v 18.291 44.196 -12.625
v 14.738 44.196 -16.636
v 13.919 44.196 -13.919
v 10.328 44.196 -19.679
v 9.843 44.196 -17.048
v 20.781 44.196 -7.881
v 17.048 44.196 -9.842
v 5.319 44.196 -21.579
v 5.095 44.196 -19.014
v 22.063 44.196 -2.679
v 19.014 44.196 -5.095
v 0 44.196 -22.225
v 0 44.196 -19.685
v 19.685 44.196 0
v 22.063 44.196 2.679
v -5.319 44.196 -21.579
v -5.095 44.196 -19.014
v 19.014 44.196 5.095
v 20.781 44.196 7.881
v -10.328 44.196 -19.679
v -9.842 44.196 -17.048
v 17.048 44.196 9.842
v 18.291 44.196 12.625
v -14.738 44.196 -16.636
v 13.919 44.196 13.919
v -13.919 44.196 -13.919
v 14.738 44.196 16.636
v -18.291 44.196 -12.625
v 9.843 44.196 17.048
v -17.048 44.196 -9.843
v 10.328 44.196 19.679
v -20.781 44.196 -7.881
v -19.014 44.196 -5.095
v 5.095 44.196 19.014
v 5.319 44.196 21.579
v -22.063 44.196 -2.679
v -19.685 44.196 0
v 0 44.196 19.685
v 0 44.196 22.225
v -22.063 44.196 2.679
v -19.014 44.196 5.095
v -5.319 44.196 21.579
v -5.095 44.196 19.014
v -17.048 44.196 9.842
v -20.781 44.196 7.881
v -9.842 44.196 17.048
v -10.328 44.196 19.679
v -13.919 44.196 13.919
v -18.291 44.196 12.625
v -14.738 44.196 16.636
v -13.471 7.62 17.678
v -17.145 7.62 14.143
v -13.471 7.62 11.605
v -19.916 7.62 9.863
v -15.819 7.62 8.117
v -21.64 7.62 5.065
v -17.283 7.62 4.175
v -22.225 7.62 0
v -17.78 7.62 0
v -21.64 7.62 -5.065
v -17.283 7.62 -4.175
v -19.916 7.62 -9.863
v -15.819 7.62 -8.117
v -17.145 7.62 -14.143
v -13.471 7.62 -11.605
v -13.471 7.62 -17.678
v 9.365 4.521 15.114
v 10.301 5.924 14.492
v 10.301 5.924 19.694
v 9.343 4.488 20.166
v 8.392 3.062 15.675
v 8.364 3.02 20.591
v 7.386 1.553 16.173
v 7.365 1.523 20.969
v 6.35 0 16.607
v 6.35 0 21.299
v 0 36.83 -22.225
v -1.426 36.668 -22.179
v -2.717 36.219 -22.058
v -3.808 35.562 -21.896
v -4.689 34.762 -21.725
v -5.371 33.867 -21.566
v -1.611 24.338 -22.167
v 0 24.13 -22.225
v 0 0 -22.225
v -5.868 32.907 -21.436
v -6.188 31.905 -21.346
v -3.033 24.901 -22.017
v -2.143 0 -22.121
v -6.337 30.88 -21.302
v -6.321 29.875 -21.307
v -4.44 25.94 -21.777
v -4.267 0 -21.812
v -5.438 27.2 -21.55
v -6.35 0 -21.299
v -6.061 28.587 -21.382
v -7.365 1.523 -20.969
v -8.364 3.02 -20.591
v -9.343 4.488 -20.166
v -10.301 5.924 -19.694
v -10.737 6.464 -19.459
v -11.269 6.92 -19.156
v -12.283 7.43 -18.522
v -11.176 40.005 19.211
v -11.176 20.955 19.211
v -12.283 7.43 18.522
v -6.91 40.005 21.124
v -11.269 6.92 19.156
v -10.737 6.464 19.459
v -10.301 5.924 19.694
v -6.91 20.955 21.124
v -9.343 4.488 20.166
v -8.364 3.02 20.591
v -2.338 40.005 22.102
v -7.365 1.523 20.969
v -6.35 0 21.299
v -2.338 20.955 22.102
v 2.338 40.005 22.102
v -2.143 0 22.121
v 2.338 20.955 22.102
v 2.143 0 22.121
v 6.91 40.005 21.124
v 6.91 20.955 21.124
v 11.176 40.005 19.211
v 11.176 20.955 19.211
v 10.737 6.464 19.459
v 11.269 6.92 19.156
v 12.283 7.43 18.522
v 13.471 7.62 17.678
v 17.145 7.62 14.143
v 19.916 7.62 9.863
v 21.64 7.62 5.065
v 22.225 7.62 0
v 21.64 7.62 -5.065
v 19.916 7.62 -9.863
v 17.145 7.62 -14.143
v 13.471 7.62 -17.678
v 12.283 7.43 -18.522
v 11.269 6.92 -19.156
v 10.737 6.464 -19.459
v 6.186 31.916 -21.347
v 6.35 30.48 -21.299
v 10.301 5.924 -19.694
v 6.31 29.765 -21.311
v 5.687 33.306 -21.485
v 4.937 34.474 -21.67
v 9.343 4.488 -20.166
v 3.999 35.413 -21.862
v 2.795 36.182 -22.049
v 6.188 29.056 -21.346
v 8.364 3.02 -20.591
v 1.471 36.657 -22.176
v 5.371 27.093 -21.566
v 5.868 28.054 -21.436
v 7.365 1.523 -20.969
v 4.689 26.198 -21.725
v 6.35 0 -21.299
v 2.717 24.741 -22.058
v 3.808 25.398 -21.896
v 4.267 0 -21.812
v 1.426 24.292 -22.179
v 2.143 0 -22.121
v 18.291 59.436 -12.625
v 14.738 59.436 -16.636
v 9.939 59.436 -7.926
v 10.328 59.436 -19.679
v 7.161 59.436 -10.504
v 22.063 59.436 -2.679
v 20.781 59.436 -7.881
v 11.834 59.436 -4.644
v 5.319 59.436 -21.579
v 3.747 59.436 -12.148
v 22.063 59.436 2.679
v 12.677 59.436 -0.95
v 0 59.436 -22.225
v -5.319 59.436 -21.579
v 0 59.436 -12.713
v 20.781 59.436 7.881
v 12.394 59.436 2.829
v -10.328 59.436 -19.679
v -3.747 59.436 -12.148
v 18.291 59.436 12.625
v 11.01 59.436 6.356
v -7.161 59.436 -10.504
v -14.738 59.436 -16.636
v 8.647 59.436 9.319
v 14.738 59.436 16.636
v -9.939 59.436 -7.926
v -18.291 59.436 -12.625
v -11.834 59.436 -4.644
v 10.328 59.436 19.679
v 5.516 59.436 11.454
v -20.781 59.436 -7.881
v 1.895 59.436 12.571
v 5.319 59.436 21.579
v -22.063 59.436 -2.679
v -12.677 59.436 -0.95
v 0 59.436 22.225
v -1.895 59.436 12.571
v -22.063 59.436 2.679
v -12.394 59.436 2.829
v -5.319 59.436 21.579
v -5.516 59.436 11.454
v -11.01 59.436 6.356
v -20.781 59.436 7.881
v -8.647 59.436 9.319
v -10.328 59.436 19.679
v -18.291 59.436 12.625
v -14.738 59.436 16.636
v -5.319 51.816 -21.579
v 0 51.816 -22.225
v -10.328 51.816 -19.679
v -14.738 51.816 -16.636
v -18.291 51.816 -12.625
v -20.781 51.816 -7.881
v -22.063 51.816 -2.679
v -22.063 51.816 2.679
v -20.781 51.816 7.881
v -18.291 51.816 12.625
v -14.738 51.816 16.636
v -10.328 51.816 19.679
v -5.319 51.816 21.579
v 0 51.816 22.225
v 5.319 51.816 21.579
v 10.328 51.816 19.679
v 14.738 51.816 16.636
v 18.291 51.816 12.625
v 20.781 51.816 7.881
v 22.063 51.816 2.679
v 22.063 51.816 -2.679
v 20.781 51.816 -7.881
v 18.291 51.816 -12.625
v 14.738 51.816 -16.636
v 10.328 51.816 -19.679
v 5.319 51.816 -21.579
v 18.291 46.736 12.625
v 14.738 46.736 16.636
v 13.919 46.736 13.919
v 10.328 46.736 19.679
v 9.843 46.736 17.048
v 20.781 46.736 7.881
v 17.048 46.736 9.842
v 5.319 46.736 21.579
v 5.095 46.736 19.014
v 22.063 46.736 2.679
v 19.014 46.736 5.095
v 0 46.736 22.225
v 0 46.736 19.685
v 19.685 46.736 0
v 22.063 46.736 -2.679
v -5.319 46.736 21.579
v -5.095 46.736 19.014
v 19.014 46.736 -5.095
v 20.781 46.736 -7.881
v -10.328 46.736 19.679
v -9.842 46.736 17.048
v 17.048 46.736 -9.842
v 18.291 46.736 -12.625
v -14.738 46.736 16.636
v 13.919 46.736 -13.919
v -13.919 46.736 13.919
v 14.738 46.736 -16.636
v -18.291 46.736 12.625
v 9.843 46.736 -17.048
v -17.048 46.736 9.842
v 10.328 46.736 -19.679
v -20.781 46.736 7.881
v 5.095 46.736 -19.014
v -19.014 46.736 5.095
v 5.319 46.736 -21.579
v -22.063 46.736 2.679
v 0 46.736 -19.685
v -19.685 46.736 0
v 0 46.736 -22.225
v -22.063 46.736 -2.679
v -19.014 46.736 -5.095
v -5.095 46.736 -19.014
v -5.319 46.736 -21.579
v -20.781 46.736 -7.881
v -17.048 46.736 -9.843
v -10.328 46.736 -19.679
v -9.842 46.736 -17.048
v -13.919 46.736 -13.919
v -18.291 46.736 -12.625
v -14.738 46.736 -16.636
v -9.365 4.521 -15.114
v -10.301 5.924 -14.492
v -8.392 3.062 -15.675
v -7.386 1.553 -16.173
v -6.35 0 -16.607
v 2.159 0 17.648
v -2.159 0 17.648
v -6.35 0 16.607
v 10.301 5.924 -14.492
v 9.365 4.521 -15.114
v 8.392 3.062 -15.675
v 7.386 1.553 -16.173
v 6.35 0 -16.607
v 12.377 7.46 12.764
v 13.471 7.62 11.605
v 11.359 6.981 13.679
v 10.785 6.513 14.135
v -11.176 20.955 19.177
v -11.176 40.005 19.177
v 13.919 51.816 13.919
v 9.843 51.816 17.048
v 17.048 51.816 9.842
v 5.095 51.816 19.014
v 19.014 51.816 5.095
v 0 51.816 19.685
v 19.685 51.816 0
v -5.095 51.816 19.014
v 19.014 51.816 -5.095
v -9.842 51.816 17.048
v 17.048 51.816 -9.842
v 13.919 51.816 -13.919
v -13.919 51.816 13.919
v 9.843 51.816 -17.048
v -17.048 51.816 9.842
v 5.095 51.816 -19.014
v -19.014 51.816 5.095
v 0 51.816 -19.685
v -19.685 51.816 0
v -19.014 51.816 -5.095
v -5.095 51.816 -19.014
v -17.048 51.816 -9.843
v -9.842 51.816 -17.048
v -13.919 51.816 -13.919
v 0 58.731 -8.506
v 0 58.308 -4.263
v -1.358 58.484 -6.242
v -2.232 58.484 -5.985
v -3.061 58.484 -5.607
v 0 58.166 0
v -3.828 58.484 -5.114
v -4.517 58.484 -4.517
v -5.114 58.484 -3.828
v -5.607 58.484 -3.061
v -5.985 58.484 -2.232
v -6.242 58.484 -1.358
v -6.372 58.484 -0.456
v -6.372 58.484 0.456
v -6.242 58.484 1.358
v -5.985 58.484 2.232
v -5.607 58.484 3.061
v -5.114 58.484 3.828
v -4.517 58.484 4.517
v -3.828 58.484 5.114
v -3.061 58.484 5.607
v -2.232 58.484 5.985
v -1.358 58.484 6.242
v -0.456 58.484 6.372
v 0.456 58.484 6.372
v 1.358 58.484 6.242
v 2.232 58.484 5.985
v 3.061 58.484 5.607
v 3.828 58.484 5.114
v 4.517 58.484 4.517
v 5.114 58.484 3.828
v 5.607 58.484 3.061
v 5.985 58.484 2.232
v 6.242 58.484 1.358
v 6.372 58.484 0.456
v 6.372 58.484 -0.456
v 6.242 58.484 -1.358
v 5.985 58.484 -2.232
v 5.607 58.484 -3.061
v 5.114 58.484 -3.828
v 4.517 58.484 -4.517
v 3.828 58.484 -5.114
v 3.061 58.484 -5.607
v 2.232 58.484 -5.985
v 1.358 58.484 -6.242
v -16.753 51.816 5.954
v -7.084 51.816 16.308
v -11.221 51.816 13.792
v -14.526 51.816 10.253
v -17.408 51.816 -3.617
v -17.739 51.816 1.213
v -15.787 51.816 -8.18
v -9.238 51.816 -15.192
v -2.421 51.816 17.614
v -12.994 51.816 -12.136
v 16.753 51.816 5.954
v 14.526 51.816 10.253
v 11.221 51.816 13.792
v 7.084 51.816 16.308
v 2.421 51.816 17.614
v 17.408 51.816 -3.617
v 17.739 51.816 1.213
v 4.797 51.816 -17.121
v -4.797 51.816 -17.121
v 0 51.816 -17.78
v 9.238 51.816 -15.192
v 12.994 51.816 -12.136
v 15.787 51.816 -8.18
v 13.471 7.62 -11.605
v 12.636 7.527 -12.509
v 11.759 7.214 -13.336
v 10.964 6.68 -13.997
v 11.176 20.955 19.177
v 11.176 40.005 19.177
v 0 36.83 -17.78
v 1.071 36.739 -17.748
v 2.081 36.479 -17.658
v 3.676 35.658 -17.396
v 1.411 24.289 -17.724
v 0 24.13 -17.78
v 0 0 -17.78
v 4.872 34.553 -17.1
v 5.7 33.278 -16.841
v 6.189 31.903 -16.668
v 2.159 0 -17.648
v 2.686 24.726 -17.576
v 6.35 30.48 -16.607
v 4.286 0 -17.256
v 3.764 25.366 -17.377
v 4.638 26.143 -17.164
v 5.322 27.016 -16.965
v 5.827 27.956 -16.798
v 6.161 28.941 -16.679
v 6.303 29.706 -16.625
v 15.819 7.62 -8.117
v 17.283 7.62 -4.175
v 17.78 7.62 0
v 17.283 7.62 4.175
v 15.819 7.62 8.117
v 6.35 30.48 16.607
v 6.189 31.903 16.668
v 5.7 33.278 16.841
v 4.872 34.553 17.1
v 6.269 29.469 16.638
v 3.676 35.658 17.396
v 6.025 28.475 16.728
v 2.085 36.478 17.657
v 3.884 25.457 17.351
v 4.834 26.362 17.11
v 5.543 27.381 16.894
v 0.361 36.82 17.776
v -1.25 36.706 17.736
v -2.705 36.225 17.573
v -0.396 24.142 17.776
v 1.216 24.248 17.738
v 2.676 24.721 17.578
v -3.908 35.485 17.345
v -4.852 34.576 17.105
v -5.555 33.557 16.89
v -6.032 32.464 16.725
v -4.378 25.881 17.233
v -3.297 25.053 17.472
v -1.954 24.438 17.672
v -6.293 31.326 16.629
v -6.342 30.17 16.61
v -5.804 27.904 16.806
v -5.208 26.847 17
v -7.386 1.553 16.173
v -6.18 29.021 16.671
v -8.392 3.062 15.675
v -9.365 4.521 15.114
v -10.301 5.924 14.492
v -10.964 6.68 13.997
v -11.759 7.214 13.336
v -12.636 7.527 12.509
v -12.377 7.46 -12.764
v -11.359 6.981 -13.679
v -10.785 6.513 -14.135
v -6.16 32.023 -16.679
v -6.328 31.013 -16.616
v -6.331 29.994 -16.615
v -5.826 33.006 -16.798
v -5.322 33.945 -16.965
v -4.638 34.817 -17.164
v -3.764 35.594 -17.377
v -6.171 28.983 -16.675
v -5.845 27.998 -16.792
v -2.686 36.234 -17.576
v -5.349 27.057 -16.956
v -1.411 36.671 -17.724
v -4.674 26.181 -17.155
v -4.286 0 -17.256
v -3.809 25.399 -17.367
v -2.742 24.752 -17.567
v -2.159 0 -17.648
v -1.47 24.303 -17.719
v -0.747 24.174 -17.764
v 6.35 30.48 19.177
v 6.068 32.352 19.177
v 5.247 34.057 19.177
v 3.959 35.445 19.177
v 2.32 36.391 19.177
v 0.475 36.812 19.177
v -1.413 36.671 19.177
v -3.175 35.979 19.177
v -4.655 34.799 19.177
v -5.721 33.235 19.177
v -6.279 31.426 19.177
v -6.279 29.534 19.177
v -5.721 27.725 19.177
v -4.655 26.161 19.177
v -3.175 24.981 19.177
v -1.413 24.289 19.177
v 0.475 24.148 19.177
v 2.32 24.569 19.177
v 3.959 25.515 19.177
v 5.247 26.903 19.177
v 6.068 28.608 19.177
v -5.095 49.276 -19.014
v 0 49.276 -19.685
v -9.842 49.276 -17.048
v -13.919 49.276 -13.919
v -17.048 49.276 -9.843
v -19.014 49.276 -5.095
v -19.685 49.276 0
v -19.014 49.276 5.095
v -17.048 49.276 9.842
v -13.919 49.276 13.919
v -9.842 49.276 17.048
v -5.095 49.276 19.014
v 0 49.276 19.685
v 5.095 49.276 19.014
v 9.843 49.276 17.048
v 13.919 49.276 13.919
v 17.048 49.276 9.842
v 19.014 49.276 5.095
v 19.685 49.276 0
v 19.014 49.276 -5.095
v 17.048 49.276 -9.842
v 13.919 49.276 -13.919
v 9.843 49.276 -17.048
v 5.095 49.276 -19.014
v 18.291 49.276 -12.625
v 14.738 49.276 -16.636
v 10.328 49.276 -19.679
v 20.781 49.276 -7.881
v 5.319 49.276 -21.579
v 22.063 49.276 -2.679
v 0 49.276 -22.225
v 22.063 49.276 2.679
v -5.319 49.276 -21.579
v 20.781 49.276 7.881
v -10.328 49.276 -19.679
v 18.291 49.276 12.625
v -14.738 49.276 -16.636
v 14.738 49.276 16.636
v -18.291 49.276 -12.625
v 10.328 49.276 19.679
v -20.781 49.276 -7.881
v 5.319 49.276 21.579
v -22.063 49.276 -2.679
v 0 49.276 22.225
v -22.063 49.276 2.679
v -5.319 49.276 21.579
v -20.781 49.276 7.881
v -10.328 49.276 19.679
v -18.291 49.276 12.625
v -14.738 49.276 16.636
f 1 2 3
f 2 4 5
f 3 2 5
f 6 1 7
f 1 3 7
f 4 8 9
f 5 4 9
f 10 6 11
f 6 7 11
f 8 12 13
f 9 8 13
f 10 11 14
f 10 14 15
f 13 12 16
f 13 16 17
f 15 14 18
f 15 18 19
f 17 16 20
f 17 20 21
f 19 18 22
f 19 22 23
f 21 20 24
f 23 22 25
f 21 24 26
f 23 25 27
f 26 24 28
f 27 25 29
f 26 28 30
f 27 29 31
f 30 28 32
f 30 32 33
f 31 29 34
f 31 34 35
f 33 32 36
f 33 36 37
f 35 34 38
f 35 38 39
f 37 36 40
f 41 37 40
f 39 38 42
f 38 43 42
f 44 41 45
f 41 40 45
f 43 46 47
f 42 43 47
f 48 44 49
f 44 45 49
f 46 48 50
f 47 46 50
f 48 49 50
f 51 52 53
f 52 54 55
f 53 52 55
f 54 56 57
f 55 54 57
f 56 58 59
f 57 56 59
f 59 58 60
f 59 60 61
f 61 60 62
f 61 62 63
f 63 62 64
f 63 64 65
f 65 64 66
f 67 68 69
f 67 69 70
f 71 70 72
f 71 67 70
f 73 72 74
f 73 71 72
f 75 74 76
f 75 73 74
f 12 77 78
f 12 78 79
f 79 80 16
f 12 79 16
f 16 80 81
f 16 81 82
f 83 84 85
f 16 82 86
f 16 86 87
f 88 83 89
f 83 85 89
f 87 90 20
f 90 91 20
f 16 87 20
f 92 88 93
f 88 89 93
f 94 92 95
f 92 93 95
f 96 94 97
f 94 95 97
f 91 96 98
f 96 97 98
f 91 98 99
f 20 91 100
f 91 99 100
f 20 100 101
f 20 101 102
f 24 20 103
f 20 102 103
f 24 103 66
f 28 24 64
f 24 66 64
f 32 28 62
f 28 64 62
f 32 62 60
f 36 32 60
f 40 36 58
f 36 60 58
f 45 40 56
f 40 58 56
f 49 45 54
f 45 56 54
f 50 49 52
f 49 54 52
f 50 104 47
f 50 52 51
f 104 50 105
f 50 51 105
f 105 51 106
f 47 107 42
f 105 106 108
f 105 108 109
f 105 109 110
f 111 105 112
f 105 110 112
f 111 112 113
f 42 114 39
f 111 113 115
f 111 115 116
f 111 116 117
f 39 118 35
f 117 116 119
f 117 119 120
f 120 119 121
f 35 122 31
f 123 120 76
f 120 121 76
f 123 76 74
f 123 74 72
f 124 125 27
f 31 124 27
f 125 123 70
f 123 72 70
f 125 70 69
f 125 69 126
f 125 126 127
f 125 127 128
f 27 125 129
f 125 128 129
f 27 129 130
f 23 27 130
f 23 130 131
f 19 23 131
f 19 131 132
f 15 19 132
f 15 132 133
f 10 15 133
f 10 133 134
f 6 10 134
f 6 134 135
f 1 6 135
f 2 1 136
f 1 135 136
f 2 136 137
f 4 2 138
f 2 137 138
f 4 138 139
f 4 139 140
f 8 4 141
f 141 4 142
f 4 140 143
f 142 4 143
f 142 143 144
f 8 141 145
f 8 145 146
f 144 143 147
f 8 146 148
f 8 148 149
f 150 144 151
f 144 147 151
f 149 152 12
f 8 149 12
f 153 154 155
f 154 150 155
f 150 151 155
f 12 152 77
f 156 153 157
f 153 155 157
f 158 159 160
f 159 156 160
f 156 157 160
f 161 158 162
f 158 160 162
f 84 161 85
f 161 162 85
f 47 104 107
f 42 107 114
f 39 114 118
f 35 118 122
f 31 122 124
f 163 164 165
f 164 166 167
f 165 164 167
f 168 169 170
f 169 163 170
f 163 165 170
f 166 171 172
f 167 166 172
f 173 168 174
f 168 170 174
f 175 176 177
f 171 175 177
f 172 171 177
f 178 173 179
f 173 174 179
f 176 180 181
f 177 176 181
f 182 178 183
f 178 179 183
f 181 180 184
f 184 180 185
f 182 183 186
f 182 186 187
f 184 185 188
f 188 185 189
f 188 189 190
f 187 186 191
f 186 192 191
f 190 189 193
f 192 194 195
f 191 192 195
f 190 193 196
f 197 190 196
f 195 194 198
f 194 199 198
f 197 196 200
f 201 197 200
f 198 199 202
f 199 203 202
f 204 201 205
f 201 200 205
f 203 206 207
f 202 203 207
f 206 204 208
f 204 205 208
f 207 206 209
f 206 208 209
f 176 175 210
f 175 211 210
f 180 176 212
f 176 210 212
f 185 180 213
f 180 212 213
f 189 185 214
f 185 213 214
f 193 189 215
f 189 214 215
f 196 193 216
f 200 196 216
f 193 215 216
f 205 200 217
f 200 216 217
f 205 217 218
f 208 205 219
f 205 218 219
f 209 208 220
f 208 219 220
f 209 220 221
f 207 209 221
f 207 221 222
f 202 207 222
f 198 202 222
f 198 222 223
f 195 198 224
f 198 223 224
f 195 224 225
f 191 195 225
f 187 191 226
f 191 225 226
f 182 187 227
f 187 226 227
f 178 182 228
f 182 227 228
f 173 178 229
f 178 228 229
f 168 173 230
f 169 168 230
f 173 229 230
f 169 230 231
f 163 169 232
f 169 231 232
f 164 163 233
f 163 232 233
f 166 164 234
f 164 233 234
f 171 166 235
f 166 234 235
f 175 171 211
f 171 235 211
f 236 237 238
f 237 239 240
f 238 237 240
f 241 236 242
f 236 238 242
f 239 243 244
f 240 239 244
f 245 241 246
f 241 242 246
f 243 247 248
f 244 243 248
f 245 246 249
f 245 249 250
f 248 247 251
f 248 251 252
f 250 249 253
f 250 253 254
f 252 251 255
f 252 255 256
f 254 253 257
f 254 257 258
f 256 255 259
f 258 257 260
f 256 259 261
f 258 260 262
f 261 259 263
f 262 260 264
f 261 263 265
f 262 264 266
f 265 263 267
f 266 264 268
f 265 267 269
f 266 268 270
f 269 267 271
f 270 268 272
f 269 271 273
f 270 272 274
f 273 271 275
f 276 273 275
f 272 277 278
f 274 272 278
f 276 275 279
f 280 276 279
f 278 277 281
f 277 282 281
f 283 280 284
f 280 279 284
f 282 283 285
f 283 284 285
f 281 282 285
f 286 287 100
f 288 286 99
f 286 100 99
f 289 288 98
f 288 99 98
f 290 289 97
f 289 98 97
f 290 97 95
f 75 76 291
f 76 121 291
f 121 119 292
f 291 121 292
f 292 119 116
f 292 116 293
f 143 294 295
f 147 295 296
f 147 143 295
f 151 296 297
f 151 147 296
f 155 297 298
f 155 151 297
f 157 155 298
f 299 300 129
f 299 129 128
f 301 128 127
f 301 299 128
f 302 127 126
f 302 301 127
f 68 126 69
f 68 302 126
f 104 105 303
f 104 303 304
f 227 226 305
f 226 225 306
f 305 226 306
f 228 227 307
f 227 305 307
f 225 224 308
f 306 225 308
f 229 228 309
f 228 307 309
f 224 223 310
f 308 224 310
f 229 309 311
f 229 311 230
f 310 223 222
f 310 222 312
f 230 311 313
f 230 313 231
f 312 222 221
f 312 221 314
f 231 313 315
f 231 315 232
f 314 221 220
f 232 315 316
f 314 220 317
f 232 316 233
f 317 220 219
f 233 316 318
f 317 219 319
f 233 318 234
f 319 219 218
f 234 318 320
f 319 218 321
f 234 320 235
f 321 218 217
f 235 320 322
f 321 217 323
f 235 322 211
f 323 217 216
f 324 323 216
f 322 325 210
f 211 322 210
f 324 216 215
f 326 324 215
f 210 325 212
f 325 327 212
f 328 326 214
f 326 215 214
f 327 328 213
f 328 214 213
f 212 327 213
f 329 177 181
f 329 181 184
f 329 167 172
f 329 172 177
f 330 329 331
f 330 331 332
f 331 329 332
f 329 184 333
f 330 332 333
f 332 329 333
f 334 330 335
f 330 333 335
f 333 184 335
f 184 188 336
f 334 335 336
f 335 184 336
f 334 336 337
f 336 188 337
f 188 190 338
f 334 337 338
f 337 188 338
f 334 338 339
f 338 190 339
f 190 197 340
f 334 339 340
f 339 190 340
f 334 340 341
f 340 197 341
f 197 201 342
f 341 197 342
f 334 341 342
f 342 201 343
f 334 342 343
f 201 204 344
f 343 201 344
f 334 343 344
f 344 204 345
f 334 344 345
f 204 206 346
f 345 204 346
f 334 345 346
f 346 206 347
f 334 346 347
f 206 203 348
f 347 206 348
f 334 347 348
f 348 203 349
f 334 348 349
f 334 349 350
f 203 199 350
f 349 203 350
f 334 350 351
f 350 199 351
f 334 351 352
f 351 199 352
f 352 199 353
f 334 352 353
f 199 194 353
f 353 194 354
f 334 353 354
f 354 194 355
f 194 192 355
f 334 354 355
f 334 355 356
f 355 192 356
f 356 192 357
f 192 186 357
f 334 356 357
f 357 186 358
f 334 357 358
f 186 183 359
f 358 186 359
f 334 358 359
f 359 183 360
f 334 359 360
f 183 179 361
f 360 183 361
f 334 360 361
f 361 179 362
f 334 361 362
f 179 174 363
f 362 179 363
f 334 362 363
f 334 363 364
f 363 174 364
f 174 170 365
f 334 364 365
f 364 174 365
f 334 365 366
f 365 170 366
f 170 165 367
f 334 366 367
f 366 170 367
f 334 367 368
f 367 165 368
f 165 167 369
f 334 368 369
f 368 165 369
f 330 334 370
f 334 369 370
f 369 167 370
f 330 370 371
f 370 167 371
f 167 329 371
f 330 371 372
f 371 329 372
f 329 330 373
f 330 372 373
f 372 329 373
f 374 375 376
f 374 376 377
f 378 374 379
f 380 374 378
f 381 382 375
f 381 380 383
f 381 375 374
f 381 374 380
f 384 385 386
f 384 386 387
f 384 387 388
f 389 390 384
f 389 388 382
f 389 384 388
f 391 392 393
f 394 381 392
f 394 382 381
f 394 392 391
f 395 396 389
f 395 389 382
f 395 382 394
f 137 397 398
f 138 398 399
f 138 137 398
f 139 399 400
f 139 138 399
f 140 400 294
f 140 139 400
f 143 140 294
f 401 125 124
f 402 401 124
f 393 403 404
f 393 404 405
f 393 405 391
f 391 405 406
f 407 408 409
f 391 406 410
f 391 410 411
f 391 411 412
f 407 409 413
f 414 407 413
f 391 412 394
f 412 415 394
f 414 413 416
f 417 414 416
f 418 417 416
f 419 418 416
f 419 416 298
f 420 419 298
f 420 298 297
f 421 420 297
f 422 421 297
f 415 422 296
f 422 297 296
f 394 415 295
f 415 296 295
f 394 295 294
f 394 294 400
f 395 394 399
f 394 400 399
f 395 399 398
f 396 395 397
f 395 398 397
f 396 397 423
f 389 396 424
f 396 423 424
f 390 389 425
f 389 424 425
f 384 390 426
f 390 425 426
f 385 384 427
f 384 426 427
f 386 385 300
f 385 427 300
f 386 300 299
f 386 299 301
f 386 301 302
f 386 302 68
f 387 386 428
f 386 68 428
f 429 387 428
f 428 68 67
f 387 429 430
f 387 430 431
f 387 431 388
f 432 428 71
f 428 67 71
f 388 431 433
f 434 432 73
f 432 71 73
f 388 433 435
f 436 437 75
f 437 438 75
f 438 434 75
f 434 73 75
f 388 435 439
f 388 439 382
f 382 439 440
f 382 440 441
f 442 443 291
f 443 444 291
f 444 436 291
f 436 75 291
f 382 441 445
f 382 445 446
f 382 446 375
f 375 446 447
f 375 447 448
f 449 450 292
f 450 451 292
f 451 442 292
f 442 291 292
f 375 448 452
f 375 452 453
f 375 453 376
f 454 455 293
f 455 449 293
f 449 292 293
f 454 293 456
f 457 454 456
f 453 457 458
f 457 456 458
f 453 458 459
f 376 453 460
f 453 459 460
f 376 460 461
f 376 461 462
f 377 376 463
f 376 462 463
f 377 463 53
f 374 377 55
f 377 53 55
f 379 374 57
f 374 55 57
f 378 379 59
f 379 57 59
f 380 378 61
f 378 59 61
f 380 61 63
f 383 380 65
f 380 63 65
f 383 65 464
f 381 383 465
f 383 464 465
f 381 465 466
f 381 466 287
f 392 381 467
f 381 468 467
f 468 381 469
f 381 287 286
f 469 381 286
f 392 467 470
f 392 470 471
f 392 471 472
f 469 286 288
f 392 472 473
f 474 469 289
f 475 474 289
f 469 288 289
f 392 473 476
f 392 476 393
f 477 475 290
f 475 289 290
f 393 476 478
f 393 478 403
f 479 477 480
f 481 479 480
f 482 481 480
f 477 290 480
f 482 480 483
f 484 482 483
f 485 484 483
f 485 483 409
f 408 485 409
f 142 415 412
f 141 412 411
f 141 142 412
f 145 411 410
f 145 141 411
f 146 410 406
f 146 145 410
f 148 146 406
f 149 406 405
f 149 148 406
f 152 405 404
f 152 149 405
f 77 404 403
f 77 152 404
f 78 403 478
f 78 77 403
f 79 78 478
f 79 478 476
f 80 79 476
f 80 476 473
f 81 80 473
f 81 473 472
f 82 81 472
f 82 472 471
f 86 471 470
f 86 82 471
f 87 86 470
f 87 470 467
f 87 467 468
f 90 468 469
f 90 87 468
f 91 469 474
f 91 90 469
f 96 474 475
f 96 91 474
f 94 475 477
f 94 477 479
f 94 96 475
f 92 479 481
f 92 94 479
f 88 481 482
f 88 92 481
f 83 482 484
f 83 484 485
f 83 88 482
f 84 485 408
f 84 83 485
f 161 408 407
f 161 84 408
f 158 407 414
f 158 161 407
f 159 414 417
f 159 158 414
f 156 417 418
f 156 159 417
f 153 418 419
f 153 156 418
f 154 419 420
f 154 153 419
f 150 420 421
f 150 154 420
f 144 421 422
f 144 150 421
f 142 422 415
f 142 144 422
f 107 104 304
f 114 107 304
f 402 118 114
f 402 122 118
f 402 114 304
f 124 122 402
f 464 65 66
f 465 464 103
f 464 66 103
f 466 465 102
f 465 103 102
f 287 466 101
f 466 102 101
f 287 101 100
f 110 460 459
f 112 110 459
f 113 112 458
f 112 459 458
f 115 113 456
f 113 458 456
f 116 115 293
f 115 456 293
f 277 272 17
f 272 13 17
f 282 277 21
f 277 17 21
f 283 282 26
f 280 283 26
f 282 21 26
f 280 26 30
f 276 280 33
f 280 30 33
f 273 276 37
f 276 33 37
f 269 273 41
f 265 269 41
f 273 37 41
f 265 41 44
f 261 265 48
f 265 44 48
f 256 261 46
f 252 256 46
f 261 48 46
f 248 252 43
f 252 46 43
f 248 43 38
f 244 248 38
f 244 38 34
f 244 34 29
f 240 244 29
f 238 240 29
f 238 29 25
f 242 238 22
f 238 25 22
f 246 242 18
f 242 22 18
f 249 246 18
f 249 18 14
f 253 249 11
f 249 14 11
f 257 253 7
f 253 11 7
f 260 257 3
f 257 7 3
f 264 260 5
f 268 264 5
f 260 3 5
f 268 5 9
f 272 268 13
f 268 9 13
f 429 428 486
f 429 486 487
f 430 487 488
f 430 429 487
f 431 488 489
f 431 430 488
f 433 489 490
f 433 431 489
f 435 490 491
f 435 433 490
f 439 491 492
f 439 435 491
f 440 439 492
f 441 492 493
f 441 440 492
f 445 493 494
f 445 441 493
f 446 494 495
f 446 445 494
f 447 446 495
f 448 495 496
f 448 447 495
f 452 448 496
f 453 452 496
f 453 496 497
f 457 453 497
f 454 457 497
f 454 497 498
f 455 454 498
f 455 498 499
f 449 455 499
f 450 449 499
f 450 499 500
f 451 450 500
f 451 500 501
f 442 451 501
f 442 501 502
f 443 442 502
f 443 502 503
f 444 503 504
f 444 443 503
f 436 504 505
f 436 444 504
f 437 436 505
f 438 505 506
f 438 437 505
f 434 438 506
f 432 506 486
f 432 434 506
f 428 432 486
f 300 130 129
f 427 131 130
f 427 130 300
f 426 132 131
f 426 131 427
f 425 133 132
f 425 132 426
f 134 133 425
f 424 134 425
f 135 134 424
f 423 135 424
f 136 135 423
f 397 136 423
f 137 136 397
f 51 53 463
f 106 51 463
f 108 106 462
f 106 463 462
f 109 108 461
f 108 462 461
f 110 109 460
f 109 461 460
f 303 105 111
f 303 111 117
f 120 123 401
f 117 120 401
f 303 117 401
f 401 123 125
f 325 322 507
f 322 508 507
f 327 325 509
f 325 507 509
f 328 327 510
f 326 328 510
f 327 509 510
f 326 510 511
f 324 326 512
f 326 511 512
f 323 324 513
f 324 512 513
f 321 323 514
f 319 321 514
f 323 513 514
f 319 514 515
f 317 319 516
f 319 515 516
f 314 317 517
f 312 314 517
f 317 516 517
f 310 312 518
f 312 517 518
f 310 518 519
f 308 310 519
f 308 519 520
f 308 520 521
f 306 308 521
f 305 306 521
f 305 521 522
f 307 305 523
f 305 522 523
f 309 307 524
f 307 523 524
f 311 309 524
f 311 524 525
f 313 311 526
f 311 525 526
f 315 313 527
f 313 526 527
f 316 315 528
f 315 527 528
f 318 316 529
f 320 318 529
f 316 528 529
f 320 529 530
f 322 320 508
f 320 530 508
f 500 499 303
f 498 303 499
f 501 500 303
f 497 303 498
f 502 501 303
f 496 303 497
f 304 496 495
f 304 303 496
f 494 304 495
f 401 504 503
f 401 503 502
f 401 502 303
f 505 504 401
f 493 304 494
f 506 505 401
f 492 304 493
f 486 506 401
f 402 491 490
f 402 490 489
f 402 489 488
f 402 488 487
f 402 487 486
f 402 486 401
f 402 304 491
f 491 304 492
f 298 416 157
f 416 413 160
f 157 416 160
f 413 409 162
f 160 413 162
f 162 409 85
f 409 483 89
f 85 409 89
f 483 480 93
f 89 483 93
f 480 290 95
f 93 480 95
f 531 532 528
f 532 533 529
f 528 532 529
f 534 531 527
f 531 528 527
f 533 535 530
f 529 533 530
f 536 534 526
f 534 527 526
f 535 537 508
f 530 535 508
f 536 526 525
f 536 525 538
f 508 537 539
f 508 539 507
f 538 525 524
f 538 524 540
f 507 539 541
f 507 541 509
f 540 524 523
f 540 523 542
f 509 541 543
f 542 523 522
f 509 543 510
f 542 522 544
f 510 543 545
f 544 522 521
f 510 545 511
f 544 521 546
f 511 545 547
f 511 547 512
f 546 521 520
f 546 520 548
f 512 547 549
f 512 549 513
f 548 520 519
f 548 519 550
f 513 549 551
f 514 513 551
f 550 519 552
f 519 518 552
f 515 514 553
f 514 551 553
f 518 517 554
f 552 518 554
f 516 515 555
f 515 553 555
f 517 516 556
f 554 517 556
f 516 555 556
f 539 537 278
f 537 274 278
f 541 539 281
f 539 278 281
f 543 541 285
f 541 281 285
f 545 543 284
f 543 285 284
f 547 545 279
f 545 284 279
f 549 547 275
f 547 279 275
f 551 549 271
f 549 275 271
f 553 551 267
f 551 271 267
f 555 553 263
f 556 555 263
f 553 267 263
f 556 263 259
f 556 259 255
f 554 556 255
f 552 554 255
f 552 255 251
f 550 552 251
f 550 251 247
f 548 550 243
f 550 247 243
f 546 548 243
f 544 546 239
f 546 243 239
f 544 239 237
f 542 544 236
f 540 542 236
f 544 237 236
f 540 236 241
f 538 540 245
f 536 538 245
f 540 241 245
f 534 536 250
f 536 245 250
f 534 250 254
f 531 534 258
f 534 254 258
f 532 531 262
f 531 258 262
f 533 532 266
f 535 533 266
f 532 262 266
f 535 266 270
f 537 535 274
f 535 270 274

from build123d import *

# Parameters (mm, degrees)
CUT_EXTRUDE1_DEPTH      = 68.23495628
CUT_EXTRUDE1_DEPTH_BACK = 68.23495628
SKETCH3_R               = 17.78
CUT_EXTRUDE2_DEPTH      = 51.816
CUT_EXTRUDE3_DEPTH      = 68.234956346
CUT_EXTRUDE3_DEPTH_BACK = 68.234956346
SKETCH4_R               = 6.35
CUT_EXTRUDE4_START      = 22.225
SKETCH5_W               = 22.352
SKETCH5_H               = 19.05
CUT_EXTRUDE4_DEPTH      = 3.048


with BuildPart() as part:
    # Sketch1 → Revolve1 (revolve)
    with BuildSketch(Plane.XY, mode=Mode.PRIVATE) as revolve1_sk:
        with BuildLine():
            Line((0, 0), (0, 58.166))
            ThreePointArc((0, 58.166), (6.387986381, 58.484288237), (12.712693656, 59.436))
            Line((12.712693656, 59.436), (22.225, 59.436))
            Line((22.225, 59.436), (22.225, 51.816))
            Line((22.225, 51.816), (19.685, 51.816))
            Line((19.685, 51.816), (19.685, 49.276))
            Line((19.685, 49.276), (22.225, 49.276))
            Line((22.225, 49.276), (22.225, 46.736))
            Line((22.225, 46.736), (19.685, 46.736))
            Line((19.685, 46.736), (19.685, 44.196))
            Line((19.685, 44.196), (22.225, 44.196))
            Line((22.225, 44.196), (22.225, 0))
            Line((22.225, 0), (0, 0))
        make_face()
    revolve(revolve1_sk.sketch.rotate(Axis((0, 59.436, 0), (0, 1, 0)), 90), axis=Axis((0, 59.436, 0), (0, 1, 0)))

    # Sketch2 → Cut-Extrude1 (cut, two sides: drawn at the far end of the back side and taken through both)
    with BuildSketch(Plane.XY.offset(-CUT_EXTRUDE1_DEPTH_BACK)):
        with BuildLine():
            Line((22.225, 0), (22.225, 7.62))
            Line((22.225, 7.62), (13.470533586, 7.62))
            ThreePointArc((13.470533586, 7.62), (11.673046061, 7.169336035), (10.300788381, 5.923957269))
            Line((10.300788381, 5.923957269), (6.35, 0))
            Line((6.35, 0), (22.225, 0))
        make_face()
        with BuildLine():
            Line((-22.225, 0), (-22.225, 7.62))
            Line((-22.225, 7.62), (-13.470533586, 7.62))
            ThreePointArc((-13.470533586, 7.62), (-11.673046061, 7.169336035), (-10.300788381, 5.923957269))
            Line((-10.300788381, 5.923957269), (-6.35, 0))
            Line((-6.35, 0), (-22.225, 0))
        make_face()
    extrude(amount=CUT_EXTRUDE1_DEPTH + CUT_EXTRUDE1_DEPTH_BACK, mode=Mode.SUBTRACT)

    # Sketch3 → Cut-Extrude2 (cut)
    with BuildSketch(Plane.XZ):
        with Locations(Location((0, 0, 0), (0, 0, 270))):
            Circle(SKETCH3_R)
    extrude(amount=-CUT_EXTRUDE2_DEPTH, mode=Mode.SUBTRACT)

    # Sketch4 → Cut-Extrude3 (cut, two sides: drawn at the far end of the back side and taken through both)
    with BuildSketch(Plane.XY.offset(-CUT_EXTRUDE3_DEPTH_BACK)):
        with Locations((0, 30.48)):
            Circle(SKETCH4_R)
    extrude(amount=CUT_EXTRUDE3_DEPTH + CUT_EXTRUDE3_DEPTH_BACK, mode=Mode.SUBTRACT)

    # Sketch5 → Cut-Extrude4 (cut)
    with BuildSketch(Plane.XY.offset(CUT_EXTRUDE4_START)):
        with Locations((0, 30.48)):
            Rectangle(SKETCH5_W, SKETCH5_H)
    extrude(amount=-CUT_EXTRUDE4_DEPTH, mode=Mode.SUBTRACT)


solid = part.part
